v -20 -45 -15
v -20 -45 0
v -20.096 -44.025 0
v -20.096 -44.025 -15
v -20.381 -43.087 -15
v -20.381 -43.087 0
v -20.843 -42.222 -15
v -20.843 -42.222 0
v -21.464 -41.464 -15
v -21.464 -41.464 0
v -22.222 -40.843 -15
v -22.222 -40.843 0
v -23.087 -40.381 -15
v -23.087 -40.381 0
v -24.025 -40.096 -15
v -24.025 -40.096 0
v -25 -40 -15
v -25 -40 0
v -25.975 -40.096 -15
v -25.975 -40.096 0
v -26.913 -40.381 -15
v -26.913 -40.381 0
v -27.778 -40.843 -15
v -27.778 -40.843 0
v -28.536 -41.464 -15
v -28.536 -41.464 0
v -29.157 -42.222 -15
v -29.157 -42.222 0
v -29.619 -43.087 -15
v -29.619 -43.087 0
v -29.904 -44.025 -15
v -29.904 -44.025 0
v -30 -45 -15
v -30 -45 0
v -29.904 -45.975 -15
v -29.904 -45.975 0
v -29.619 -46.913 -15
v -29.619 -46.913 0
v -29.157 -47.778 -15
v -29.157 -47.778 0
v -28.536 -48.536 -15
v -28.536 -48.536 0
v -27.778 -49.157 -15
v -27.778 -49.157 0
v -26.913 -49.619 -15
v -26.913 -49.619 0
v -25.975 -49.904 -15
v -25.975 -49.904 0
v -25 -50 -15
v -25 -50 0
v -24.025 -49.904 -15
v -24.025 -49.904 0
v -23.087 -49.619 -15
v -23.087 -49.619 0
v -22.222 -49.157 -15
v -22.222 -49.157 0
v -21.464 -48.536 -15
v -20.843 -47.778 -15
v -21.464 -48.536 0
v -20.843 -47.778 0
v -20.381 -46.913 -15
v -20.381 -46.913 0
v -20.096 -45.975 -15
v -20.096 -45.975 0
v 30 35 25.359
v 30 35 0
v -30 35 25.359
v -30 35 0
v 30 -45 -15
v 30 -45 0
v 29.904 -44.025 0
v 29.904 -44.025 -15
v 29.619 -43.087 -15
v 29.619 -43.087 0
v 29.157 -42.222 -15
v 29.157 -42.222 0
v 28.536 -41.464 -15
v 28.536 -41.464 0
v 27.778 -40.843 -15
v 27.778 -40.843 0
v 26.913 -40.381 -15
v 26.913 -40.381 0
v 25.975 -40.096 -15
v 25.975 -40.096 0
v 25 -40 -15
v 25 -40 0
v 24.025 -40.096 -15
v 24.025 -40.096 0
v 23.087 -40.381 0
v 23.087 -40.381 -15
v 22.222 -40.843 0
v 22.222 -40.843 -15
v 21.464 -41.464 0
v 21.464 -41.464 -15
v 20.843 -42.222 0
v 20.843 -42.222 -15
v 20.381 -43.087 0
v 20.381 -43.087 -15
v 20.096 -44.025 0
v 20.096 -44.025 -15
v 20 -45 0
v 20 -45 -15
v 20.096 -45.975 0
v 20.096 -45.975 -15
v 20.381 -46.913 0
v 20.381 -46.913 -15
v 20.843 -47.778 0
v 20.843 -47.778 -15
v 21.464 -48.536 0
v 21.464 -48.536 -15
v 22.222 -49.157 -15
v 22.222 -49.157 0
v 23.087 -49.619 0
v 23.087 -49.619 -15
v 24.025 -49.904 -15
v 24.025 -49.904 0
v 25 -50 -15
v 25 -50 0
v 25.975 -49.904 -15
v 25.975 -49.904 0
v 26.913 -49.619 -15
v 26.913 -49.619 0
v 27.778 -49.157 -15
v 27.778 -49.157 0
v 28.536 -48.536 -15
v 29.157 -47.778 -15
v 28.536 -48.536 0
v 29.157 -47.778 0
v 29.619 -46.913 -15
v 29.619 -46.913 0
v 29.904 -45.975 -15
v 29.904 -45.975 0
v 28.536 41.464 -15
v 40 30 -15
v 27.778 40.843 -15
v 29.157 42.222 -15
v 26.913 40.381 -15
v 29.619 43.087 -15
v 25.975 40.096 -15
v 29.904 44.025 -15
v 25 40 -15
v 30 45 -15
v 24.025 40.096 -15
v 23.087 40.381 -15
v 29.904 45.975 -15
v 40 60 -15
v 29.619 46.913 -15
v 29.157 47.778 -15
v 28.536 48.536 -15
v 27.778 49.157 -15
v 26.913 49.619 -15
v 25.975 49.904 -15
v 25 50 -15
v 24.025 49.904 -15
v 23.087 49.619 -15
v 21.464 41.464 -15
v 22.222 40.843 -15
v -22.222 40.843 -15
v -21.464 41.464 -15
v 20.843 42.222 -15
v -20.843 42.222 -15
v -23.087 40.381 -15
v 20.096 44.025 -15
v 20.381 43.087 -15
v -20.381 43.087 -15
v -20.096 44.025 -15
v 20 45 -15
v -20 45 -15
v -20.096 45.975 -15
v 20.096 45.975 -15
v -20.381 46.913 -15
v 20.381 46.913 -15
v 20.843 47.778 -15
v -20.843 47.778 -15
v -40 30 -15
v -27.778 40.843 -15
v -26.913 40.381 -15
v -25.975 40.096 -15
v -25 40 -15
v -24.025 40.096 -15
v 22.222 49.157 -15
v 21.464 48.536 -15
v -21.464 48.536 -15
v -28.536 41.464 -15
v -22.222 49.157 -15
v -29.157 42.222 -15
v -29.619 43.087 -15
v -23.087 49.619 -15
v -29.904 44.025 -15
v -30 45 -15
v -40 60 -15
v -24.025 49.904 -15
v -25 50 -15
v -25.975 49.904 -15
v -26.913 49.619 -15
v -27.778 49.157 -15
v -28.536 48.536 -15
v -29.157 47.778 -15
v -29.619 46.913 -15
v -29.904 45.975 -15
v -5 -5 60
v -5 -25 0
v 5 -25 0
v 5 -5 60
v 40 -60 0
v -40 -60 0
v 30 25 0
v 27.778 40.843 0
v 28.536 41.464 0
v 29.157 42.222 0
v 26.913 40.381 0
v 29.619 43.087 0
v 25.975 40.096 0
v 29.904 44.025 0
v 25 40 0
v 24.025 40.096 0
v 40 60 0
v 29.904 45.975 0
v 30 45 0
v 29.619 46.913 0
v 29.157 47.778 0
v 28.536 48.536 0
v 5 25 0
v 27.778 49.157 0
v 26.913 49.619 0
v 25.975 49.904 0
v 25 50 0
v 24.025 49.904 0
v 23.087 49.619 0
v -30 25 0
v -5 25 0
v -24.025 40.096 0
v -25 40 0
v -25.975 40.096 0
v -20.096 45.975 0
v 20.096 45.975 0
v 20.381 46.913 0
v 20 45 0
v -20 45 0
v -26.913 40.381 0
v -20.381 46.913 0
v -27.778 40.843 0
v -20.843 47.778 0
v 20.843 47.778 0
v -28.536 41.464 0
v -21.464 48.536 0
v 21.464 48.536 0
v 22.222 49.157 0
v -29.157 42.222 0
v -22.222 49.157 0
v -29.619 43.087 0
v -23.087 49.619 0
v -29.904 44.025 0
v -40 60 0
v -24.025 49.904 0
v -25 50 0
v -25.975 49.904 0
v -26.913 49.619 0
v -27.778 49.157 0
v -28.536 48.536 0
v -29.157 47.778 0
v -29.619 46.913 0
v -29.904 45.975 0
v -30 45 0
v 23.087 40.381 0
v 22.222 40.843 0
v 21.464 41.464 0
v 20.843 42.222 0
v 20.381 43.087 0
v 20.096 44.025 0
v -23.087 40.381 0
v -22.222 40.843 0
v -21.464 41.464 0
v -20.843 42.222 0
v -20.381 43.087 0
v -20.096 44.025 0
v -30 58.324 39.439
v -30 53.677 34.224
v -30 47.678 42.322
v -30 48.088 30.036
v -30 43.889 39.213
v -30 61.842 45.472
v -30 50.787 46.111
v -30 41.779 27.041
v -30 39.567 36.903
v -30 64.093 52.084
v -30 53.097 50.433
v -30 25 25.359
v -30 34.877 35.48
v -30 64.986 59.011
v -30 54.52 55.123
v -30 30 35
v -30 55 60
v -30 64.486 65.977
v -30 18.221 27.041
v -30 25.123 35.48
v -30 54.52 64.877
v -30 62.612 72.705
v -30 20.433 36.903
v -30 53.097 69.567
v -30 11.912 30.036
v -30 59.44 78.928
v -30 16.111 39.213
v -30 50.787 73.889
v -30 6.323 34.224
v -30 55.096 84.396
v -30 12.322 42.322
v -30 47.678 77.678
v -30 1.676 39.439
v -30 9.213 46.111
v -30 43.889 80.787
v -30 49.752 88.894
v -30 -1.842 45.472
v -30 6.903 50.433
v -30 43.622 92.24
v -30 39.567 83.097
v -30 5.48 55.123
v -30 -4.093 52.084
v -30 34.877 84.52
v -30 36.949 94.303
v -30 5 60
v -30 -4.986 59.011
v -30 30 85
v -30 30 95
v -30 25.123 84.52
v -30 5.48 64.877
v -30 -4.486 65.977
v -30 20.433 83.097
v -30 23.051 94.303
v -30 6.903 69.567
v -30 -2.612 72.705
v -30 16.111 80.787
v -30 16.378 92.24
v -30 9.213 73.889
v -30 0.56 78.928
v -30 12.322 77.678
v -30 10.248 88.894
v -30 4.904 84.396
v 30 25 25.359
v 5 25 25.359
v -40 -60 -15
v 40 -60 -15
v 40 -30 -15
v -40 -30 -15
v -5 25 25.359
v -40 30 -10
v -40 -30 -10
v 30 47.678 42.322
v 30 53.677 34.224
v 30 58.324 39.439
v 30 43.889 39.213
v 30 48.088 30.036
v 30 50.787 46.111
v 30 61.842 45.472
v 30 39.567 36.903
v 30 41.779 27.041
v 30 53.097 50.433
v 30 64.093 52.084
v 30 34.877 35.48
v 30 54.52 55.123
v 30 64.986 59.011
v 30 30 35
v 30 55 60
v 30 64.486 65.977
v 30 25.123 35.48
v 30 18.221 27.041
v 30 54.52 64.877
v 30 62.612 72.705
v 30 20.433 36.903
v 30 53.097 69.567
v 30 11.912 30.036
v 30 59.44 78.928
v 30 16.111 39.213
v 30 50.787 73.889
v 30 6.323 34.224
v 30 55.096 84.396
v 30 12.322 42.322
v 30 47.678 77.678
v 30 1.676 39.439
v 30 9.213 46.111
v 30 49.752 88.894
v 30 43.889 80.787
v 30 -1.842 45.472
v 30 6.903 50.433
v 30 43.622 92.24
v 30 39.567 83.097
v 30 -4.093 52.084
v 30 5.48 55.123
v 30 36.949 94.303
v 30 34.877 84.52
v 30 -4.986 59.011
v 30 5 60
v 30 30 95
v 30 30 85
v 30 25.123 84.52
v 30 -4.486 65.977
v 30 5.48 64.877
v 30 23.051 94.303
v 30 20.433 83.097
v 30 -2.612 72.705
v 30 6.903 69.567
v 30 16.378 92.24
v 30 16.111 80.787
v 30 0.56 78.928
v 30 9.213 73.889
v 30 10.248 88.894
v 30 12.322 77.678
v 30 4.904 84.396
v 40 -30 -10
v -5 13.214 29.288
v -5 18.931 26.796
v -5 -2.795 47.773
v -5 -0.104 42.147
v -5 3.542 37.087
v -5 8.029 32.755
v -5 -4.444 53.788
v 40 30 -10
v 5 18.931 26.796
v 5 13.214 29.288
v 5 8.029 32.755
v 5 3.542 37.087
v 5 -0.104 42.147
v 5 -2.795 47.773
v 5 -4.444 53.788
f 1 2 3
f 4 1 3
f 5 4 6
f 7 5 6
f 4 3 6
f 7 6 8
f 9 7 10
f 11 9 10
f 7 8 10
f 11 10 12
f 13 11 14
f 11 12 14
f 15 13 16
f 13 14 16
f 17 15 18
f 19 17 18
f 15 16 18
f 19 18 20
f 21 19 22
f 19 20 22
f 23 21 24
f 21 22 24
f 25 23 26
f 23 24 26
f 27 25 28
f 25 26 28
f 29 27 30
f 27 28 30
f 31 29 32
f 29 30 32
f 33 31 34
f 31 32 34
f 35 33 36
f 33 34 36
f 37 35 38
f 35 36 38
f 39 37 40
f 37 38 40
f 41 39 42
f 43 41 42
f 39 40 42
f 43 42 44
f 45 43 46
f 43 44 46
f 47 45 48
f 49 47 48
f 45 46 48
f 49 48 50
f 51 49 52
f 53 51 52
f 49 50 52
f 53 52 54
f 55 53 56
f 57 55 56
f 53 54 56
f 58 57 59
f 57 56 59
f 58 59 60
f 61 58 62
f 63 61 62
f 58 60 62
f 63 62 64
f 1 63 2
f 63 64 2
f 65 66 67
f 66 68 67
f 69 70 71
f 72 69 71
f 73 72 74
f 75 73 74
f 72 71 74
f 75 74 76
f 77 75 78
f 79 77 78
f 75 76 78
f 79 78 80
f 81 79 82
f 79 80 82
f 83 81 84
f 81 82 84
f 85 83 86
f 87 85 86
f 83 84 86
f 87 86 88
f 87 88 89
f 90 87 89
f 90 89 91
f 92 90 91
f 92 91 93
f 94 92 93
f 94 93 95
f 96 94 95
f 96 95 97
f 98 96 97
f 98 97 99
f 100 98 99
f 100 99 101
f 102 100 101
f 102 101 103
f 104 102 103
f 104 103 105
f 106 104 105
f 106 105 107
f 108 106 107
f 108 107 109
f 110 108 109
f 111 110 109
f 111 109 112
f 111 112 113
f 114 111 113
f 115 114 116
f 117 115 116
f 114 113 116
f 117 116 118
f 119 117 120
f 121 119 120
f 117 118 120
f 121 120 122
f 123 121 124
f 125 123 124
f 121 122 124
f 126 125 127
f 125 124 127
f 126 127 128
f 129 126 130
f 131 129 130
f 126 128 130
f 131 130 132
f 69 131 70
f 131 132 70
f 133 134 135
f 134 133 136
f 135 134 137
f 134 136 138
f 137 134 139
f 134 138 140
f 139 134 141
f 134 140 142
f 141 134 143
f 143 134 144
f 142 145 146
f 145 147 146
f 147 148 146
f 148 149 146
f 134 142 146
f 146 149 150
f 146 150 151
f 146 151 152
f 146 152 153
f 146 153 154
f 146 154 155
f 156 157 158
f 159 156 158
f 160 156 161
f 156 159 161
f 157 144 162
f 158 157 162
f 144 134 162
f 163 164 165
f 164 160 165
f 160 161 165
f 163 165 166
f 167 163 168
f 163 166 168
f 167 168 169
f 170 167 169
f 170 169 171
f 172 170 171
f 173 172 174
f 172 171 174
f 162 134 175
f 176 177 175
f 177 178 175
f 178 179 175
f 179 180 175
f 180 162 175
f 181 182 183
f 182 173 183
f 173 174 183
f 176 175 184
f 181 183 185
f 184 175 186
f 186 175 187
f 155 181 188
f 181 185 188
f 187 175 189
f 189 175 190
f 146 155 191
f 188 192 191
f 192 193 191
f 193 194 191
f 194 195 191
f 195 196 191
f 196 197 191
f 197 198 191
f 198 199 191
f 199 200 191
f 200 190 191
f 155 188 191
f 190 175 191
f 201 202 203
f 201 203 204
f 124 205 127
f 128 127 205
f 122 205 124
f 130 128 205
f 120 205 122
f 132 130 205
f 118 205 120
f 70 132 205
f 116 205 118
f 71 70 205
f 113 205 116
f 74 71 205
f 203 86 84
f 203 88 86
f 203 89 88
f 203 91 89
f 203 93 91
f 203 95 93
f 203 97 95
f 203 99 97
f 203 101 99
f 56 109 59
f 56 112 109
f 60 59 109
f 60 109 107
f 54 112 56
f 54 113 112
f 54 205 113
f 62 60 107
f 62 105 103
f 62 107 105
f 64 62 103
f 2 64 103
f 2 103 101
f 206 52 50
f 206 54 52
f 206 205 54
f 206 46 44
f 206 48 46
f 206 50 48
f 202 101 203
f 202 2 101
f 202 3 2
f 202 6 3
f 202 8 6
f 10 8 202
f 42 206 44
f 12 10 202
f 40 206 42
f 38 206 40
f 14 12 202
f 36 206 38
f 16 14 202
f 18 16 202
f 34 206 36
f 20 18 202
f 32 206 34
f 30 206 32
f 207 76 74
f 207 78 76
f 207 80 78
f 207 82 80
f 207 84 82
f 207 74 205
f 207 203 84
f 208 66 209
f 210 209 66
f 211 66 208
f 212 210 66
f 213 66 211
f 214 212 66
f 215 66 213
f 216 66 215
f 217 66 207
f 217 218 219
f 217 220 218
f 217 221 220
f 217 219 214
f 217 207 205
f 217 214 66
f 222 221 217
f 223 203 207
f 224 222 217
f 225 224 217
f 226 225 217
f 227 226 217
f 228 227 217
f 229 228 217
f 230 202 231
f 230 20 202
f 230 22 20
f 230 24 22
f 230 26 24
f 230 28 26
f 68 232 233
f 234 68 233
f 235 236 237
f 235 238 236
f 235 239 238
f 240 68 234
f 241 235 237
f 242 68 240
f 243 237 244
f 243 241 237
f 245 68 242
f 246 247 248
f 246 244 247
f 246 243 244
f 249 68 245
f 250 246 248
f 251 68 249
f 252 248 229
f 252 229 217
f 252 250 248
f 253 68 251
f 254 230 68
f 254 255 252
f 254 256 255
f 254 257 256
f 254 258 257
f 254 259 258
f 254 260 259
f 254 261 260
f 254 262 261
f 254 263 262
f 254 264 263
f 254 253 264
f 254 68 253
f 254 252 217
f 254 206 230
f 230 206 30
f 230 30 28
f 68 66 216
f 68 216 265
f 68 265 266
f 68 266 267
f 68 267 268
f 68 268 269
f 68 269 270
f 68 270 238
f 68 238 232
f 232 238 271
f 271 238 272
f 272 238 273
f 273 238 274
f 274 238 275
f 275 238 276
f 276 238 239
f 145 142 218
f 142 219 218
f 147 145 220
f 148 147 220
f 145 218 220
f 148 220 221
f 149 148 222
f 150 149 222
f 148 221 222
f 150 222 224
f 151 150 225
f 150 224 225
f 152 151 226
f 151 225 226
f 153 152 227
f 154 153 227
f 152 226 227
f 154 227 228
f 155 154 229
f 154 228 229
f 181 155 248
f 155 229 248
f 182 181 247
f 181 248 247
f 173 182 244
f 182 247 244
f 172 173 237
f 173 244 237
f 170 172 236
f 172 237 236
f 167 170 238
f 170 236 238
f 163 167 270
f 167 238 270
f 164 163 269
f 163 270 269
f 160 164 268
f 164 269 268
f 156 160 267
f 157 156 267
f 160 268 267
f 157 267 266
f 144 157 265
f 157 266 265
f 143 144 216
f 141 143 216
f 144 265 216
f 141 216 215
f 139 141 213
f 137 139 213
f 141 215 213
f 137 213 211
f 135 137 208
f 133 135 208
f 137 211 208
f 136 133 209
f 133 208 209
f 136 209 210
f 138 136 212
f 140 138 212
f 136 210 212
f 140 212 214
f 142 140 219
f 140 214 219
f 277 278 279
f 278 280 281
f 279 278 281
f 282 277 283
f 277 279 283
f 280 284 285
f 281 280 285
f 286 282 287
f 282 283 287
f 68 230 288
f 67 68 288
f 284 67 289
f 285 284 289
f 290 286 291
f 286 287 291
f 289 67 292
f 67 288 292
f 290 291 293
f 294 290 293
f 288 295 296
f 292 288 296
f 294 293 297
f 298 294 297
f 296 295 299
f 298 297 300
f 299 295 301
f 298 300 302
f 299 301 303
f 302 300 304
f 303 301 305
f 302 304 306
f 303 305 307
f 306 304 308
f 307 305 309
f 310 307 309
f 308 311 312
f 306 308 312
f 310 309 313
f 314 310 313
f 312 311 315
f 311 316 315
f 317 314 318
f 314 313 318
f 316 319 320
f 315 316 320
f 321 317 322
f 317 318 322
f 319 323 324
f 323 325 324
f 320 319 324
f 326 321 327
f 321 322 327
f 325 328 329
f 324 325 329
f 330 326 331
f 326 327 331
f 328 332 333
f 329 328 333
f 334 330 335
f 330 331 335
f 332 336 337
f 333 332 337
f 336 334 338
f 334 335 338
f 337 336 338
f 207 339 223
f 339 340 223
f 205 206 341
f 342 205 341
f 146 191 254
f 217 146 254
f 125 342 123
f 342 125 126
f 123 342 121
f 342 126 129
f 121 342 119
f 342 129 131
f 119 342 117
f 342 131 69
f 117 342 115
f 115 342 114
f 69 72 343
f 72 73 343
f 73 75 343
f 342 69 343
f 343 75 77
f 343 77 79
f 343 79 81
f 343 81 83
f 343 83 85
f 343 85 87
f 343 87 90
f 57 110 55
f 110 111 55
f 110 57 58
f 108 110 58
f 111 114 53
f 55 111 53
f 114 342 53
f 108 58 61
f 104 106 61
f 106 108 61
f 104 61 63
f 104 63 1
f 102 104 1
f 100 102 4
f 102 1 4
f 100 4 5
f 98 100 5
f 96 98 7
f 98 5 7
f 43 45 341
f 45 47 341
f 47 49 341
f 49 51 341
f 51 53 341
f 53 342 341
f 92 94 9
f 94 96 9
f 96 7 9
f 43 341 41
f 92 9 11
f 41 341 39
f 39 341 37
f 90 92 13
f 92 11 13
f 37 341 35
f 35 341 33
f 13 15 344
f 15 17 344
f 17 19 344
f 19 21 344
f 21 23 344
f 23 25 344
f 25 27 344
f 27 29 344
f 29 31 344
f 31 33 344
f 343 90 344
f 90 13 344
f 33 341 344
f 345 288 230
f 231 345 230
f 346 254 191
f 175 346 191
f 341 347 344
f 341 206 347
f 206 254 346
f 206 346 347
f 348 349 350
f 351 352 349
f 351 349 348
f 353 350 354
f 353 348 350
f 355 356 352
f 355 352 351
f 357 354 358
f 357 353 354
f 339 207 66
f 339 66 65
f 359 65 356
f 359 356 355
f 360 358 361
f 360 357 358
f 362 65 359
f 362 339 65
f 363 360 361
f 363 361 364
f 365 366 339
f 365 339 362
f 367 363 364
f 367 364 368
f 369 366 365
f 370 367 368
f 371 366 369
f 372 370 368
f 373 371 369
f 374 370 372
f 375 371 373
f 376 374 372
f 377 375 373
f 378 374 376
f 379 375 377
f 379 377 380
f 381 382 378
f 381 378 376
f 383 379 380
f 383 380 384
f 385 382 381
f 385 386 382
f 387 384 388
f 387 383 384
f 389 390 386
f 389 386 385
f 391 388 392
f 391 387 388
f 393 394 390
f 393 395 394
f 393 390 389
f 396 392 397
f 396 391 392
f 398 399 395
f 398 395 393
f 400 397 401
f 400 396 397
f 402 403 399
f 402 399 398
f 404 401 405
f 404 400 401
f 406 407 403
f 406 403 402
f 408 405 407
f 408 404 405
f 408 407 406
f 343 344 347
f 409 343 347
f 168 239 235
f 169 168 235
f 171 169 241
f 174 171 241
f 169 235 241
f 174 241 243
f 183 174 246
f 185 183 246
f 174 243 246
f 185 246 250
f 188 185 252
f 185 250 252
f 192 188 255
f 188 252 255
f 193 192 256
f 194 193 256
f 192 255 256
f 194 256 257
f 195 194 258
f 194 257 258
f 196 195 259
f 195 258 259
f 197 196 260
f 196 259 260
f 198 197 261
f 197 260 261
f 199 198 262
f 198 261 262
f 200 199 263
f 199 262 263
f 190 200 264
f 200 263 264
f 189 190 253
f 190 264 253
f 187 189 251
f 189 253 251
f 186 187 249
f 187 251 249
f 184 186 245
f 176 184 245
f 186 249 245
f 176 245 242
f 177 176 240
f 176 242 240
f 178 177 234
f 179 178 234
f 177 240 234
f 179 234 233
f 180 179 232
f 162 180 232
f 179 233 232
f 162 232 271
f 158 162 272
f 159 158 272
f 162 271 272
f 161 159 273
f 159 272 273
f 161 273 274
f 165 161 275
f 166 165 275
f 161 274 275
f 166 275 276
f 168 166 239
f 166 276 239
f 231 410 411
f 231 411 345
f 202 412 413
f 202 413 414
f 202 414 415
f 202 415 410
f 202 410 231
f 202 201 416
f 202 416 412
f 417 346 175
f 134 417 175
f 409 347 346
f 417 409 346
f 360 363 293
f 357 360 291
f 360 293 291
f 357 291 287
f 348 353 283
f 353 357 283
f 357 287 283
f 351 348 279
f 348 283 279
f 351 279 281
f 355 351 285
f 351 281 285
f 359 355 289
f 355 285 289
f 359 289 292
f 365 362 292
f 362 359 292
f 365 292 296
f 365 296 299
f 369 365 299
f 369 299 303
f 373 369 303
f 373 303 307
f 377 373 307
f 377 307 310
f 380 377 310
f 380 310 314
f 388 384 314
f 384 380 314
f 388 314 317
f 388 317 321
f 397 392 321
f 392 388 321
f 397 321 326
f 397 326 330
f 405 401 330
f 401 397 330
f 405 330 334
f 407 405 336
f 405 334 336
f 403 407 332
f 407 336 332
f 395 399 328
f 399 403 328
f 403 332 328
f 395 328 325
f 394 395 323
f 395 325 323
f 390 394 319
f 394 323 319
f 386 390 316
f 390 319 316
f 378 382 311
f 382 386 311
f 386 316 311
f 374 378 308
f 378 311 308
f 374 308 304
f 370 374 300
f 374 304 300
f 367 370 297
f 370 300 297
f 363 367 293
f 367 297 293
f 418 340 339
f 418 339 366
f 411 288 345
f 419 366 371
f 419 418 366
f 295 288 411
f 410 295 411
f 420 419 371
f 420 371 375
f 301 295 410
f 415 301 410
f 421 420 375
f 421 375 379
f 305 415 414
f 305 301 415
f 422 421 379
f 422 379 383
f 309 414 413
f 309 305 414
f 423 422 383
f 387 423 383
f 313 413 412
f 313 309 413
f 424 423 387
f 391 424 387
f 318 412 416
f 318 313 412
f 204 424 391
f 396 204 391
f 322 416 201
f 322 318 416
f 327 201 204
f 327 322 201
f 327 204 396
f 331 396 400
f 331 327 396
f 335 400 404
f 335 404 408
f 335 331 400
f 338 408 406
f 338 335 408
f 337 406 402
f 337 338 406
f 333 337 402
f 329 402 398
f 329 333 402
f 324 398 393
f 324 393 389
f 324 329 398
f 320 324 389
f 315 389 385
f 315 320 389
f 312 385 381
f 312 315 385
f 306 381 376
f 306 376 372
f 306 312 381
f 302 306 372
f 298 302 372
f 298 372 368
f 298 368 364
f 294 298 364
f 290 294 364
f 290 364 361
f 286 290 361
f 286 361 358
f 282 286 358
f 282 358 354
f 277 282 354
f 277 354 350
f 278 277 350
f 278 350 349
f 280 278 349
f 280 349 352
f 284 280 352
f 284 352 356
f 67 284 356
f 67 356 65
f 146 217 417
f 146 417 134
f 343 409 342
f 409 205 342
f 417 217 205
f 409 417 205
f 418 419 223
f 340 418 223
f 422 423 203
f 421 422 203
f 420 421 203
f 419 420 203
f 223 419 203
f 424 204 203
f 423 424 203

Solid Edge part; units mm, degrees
sketch "Sketch1" plane through (0, 0, 0) normal (1, 0, 0) x (0, 1, 0)
  line L0 (-60, 0) -> (60, 0)
  line L1 (60, -15) -> (60, 0)
  line L2 (30, -15) -> (60, -15)
  line L3 (30, -10) -> (30, -15)
  line L4 (-30, -10) -> (30, -10)
  line L5 (-30, -15) -> (-30, -10)
  line L6 (-60, -15) -> (-30, -15)
  line L7 (-60, 0) -> (-60, -15)
extrude "Protrusion1" add sketch "Sketch1" along normal mid plane 80
sketch "Sketch2" plane through (0, 0, 0) normal (1, 0, 0) x (0, 1, 0)
  line L0 (35, 0) -> (35, 25.359)
  line L1 (25, 25.359) -> (25, 0)
  line L2 (25, 0) -> (35, 0)
  arc A0 (25, 25.359) -> (35, 25.359) centre (30, 60) cw
  circle A1 centre (30, 60) radius 25
extrude "ExtrudedProtrusion_2" add sketch "Sketch2" along normal mid plane 60
sketch "Sketch3" plane through (0, 0, 0) normal (1, 0, 0) x (0, 1, 0)
  line L0 (-25, 0) -> (-5, 60)
  line L1 (25, 0) -> (-25, 0)
  line L2 (25, 25.359) -> (25, 0)
  arc A0 (-5, 60) -> (25, 25.359) centre (30, 60) ccw
extrude "ExtrudedProtrusion_3" add sketch "Sketch3" along normal mid plane 10
sketch "Sketch4" plane through (0, 0, 0) normal (0, 0, 1) x (1, 0, 0)
  circle A0 centre (25, -45) radius 5
  circle A1 centre (-25, -45) radius 5
  circle A2 centre (25, 45) radius 5
  circle A3 centre (-25, 45) radius 5
extrude "ExtrudedCutout_1" cut sketch "Sketch4" against normal blind 57.0095
